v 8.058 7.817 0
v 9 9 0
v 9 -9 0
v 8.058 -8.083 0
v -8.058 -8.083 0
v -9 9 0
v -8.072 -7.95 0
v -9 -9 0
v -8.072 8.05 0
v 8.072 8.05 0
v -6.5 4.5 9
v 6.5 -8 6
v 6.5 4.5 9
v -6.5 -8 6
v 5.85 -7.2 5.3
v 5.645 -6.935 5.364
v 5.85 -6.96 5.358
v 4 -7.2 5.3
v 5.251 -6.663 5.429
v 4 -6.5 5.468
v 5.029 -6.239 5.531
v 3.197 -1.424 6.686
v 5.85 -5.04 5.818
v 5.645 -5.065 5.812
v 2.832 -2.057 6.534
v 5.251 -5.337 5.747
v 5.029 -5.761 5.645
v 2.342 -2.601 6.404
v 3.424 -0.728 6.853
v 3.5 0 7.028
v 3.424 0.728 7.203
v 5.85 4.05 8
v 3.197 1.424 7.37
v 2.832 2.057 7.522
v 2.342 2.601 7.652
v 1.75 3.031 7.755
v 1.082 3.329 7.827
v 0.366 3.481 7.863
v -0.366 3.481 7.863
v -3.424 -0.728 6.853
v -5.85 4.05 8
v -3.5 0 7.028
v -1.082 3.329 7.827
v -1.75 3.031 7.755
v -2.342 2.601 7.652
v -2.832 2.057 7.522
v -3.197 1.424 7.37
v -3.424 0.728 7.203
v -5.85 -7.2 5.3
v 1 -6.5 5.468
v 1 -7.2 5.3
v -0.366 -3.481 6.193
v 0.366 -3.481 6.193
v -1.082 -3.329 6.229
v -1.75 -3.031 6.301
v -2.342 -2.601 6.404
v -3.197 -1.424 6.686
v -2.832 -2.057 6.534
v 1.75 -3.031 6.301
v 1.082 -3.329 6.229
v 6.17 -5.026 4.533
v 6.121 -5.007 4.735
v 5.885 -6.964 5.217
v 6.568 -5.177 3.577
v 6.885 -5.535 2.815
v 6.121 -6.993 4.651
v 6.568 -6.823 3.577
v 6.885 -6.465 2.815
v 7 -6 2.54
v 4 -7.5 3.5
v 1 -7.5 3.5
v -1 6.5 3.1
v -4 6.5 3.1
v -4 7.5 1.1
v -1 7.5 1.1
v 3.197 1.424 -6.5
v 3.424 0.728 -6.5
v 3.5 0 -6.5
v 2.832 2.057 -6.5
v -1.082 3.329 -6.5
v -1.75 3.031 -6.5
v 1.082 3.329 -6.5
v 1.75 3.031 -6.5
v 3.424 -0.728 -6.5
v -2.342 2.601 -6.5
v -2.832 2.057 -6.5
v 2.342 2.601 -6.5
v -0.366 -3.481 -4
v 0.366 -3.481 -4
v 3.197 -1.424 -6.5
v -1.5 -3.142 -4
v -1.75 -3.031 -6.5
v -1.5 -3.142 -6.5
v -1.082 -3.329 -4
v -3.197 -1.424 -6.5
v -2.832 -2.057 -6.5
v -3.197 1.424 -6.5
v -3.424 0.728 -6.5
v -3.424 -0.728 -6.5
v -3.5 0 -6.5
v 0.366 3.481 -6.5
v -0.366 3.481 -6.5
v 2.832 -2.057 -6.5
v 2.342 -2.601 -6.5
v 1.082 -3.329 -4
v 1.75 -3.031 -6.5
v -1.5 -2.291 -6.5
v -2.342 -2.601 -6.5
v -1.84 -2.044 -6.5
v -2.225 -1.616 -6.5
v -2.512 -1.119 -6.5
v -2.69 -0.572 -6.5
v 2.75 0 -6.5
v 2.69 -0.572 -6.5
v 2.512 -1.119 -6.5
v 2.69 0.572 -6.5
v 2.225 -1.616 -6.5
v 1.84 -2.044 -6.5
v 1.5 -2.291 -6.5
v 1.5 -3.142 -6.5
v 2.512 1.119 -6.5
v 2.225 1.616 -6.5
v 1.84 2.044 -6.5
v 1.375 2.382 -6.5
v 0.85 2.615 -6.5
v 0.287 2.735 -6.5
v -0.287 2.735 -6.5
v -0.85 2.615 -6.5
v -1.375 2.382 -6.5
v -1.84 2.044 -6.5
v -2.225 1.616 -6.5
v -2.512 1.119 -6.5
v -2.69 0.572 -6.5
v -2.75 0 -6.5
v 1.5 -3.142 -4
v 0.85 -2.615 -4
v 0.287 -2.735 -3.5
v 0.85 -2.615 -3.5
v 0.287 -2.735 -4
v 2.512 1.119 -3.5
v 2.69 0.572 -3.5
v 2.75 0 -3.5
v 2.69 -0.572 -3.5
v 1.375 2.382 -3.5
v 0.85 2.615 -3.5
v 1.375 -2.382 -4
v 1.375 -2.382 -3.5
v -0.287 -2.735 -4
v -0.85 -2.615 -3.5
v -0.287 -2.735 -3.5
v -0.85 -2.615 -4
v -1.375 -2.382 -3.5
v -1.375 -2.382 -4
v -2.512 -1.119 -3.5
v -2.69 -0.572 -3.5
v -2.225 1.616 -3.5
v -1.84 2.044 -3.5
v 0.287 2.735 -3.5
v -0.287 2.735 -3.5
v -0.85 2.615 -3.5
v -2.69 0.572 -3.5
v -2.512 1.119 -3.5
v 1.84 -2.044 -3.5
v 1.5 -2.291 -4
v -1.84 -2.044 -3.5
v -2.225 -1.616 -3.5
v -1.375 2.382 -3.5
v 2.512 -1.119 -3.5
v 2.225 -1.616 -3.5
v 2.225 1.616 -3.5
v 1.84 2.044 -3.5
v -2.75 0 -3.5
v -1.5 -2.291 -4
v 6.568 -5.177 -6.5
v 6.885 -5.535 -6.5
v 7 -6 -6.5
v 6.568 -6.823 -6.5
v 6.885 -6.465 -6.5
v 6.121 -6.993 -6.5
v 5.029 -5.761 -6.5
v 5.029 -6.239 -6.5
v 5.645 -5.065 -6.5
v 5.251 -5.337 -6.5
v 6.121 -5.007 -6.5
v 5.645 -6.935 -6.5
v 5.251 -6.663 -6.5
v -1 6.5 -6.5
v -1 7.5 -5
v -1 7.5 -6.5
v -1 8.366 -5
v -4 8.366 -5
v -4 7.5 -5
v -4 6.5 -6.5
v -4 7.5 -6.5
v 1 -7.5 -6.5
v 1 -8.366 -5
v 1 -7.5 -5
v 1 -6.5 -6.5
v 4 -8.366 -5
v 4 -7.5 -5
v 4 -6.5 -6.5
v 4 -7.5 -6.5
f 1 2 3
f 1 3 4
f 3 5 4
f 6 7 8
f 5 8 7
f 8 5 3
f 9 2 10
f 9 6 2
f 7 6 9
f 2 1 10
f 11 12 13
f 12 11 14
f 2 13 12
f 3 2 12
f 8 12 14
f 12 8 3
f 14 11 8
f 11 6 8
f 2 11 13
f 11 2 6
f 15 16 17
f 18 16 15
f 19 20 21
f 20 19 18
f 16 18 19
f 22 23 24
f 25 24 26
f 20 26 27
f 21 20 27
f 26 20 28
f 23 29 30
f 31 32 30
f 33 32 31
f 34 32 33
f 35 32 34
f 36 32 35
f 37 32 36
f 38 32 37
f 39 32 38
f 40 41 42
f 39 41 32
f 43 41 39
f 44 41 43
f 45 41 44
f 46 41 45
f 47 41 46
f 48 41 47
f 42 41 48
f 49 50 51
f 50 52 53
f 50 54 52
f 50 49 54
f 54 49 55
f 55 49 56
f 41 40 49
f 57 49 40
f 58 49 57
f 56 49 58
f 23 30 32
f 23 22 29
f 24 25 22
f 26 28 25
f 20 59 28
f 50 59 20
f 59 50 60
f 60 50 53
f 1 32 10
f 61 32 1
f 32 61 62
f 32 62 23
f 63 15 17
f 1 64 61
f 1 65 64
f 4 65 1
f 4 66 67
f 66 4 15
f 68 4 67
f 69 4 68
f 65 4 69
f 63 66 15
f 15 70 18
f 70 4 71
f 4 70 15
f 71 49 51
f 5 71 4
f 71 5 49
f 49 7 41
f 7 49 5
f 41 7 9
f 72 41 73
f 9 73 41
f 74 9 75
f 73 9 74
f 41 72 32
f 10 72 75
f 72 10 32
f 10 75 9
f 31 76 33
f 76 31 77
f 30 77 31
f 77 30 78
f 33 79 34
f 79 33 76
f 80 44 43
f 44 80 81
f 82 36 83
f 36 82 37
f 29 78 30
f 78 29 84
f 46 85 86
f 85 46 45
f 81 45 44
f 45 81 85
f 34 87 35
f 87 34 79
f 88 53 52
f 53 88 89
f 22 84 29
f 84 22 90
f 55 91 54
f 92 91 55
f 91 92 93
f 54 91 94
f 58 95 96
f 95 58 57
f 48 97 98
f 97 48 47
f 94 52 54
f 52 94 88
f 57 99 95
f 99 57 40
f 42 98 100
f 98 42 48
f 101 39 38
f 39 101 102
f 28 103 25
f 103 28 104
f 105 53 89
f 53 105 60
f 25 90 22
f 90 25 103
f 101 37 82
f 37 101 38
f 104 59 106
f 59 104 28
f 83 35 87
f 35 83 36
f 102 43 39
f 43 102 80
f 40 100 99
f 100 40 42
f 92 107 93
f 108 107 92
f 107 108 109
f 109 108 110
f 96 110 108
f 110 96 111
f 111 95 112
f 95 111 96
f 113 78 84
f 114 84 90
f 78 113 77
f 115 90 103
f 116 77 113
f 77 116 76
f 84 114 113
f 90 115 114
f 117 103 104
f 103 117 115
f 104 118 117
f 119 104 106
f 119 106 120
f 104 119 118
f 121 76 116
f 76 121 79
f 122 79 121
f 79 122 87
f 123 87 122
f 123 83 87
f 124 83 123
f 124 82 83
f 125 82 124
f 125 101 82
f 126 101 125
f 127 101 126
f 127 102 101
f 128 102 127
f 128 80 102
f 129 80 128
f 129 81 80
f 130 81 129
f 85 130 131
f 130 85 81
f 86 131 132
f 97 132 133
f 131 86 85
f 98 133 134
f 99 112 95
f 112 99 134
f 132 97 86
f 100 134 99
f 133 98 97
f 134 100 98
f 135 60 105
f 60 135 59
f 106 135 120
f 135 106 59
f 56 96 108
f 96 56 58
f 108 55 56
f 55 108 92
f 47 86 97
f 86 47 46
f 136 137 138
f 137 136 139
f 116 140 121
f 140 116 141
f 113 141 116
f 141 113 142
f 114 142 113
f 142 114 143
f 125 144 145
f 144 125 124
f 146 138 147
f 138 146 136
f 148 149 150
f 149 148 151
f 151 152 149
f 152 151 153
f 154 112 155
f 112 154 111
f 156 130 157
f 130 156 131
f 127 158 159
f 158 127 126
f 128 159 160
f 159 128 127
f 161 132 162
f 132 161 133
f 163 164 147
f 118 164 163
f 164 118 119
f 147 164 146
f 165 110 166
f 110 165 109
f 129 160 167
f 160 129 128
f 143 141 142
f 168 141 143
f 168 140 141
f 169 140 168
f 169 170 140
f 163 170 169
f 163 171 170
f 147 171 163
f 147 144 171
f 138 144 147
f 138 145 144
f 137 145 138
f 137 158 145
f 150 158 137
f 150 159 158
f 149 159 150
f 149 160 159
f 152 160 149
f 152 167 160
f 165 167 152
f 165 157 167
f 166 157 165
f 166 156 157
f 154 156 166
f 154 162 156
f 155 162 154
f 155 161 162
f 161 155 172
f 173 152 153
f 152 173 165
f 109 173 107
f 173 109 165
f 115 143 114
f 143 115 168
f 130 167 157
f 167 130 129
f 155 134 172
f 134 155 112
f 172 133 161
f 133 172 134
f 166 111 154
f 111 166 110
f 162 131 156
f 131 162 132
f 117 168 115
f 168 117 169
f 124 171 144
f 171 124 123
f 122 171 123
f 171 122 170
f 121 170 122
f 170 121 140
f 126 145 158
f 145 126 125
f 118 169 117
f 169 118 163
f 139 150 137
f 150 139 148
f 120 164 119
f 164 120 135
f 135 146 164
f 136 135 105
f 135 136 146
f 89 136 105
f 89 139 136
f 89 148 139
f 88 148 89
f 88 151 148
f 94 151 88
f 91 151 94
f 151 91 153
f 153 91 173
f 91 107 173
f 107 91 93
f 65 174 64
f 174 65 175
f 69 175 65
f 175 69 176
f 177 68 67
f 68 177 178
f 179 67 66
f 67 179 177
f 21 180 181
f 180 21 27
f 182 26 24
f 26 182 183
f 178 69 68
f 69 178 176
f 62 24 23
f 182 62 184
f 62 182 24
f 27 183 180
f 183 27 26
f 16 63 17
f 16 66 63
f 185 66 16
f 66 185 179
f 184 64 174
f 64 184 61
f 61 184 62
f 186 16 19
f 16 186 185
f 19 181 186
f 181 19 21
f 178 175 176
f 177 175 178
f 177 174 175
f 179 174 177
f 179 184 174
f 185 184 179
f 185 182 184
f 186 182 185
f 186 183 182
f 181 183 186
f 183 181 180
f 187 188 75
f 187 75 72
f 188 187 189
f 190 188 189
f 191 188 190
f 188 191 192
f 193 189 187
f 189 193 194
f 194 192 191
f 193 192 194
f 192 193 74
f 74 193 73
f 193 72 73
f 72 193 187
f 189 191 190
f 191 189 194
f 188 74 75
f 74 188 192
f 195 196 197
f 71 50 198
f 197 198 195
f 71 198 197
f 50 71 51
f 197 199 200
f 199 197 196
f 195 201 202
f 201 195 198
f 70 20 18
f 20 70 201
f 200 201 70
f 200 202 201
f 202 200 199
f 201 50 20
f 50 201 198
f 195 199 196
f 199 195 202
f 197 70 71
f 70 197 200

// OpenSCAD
$fs = 0.5;

key();

module key(){
	color("MediumSeaGreen"){
		key_body();
		middle_tube();
		pin();
		clips();
	}
}

module clips(){
	intersection(){
		union(){
			translate([-2.5,6.5,0]) clip();
			translate([2.5,-6.5,0]) rotate([0,0,180]) clip();	
		}
		bounds();
	}
}

module clip(){
	translate([-1.5,0,-6.5])
	union(){
		cube([3,1,12]);
		difference(){
			cube([3,2,1.5]);
			translate([-1,1,0]) rotate([-30,0,0]) cube([5,4,4]);
		}
	}
}

module pin(){
	intersection(){
		translate([6,-6,-6.5]) cylinder(h=14, r=1);	
		bounds();
	}
}

module middle_tube(){
	intersection(){
		difference(){
			translate([0,0,-6.5]) cylinder(h=15, r=3.5);
			translate([0,0,-7]) cylinder(h=3.5, r=2.75);
			translate([-1.5,-5, -7]) cube([3,5,3]);
		}
		bounds();
	}
}

module key_body(){
	difference(){
		key_body_primitive();
		translate([0,0,-0.1]) scale([0.9, 0.9, 0.9]) key_body_primitive();
	}
}

module bounds(){
	union(){
		key_body_primitive();
		translate([-9,-9,-20]) cube([18,18,20]);
	}
}

module key_body_primitive(){
	polyhedron(
		points=[
			[ 9, 9, 0],	//lower points
			[ 9,-9, 0],
			[-9,-9, 0],
			[-9, 9, 0],
			
			[6.5, 4.5, 9],	//higher points
			[6.5, -8, 6],
			[-6.5, -8, 6],
			[-6.5, 4.5, 9]
		],
		triangles=[
			[1,0,2],	//bottom
			[3,2,0],
			[4,5,6],	//top
			[6,7,4],
	
			[0,5,4],	//east
			[0,1,5],
			[1,6,5],	//south
			[1,2,6],
			[2,7,6],	//west
			[2,3,7],
			[3,4,7],	//north
			[3,0,4],
		]
	);
}
